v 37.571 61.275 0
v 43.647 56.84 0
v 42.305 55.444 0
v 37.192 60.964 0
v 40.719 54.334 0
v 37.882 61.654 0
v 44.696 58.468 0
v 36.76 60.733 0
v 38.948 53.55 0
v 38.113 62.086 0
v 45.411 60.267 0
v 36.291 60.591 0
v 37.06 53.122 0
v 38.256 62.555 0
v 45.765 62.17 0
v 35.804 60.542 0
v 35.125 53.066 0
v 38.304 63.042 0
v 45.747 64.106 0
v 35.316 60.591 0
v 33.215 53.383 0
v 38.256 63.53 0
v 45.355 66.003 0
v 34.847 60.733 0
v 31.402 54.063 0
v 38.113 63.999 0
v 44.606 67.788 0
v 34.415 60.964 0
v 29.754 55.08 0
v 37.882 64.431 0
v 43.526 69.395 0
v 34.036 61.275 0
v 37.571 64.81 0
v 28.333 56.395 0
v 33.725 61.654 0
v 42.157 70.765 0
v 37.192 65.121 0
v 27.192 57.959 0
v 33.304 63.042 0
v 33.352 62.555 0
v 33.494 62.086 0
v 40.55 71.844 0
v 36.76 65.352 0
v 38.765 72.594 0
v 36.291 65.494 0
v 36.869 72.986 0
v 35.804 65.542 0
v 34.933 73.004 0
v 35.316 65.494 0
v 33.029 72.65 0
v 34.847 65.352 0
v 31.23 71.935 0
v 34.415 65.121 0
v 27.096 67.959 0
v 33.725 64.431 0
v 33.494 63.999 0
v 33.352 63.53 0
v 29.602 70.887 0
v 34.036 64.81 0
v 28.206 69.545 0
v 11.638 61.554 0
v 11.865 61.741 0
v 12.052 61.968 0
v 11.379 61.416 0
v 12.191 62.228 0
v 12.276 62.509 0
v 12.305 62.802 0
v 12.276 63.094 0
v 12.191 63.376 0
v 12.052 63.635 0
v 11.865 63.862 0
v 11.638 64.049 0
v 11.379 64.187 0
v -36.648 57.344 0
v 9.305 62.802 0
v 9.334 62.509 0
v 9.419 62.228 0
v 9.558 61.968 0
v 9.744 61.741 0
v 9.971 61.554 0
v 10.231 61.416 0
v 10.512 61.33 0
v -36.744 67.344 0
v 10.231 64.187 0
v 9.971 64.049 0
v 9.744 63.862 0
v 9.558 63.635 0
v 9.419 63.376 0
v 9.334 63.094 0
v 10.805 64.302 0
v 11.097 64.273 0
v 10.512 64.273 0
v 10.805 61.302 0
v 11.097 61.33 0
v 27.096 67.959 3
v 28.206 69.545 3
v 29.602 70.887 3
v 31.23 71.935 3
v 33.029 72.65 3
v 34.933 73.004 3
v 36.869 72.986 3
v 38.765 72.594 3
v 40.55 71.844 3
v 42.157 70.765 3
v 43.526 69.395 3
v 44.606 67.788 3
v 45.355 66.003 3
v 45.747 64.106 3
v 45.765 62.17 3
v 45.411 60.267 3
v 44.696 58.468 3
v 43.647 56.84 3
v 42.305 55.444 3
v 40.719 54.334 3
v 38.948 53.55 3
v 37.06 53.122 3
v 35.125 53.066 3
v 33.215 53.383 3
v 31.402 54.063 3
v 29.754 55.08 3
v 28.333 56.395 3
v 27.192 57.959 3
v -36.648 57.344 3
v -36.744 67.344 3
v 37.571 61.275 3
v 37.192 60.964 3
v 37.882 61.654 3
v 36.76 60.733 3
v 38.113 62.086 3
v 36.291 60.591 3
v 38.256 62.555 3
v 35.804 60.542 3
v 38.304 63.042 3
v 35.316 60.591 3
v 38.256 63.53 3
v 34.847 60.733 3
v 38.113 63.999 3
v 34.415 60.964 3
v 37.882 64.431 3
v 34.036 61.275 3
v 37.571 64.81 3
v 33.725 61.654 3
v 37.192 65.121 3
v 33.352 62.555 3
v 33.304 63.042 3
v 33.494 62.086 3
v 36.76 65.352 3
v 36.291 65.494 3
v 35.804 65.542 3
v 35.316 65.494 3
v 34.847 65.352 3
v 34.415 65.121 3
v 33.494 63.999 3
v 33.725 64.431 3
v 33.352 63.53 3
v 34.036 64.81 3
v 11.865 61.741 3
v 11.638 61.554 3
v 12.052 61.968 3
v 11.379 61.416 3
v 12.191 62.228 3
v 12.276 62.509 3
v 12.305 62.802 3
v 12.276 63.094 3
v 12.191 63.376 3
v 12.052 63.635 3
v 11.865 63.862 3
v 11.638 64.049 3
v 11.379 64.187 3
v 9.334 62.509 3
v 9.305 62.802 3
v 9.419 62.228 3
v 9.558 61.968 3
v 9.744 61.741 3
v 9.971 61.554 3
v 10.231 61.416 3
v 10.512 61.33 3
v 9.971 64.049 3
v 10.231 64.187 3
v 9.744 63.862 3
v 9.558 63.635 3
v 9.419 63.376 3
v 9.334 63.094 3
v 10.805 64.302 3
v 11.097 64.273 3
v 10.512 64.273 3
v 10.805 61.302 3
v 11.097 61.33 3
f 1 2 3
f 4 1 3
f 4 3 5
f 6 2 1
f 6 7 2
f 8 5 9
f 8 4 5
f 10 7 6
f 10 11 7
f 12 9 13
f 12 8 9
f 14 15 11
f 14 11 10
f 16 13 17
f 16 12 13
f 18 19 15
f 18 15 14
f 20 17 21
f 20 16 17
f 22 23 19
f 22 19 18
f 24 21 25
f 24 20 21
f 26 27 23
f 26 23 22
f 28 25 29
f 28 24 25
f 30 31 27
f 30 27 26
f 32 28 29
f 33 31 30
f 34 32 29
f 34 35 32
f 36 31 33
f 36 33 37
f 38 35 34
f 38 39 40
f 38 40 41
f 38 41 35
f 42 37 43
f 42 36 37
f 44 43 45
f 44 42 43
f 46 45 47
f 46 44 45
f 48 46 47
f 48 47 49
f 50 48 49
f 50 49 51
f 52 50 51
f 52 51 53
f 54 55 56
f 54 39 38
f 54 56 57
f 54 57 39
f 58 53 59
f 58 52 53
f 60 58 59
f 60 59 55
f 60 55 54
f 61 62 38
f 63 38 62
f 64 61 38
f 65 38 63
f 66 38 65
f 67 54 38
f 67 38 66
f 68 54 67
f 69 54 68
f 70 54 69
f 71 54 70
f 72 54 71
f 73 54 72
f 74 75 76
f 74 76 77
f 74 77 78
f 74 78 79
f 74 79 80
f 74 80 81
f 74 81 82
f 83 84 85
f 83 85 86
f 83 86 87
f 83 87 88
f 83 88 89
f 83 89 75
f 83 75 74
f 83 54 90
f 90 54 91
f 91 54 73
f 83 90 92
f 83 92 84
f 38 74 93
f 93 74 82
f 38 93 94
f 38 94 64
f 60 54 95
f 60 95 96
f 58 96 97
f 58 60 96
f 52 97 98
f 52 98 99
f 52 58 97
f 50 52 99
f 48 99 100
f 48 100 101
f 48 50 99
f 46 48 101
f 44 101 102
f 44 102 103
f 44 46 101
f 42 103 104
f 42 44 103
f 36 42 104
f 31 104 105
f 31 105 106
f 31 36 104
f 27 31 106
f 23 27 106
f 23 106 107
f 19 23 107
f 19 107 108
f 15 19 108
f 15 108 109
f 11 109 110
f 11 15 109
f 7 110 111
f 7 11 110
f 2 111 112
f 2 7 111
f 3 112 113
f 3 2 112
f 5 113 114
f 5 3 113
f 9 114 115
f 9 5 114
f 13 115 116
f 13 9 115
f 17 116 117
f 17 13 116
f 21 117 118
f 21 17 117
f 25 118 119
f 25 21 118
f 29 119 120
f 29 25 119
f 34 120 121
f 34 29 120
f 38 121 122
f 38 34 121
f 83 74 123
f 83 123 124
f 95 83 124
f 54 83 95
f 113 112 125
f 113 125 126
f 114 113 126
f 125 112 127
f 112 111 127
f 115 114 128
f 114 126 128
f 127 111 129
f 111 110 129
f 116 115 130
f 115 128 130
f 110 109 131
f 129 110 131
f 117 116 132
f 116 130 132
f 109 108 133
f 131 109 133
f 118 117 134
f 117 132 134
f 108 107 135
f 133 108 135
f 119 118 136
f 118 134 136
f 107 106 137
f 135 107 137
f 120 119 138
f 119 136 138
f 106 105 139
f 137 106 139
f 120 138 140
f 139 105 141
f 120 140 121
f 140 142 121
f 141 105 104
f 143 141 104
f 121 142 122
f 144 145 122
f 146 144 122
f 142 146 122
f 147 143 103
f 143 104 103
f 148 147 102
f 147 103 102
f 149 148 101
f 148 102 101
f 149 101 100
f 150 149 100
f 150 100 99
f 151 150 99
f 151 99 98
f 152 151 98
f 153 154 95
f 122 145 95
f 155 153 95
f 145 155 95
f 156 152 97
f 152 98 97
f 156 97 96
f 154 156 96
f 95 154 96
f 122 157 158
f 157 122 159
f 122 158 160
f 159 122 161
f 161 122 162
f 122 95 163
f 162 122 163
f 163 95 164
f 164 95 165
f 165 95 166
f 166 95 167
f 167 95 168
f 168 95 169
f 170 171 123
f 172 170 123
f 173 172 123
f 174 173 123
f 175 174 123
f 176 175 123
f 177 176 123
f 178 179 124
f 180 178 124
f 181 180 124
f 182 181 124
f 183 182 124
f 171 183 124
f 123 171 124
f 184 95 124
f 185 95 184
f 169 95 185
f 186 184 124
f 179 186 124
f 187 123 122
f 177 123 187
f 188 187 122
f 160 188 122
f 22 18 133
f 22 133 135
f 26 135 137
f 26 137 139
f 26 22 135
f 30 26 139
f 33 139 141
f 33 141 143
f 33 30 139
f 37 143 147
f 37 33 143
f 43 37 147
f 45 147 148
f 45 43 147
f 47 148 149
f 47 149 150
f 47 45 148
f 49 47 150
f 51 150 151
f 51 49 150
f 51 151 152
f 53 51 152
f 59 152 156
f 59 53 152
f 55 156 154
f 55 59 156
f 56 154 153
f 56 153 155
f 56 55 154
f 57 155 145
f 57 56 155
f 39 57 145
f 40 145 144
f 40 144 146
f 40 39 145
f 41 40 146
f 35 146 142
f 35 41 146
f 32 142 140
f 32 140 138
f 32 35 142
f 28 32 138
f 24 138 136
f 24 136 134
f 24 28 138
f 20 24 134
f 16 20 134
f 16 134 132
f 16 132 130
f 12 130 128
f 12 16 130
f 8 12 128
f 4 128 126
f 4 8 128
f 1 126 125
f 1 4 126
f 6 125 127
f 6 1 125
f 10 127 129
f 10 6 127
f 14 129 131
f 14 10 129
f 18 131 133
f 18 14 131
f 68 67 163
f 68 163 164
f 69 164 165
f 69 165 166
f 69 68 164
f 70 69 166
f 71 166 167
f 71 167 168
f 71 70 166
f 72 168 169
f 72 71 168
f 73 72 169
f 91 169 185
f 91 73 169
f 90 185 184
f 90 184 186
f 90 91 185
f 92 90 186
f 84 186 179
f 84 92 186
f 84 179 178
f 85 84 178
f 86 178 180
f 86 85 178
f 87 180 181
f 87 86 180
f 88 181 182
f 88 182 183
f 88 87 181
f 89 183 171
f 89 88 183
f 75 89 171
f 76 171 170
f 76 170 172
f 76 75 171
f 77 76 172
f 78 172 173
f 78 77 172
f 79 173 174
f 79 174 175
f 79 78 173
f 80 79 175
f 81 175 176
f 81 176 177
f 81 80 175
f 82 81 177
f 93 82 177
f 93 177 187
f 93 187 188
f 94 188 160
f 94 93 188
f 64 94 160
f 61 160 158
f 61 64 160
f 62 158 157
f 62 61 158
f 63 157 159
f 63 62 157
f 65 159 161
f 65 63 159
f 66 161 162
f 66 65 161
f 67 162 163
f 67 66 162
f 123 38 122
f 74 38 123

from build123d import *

# Parameters (mm, degrees)
SKETCH1_R           = 2.5
SKETCH1_R_2         = 1.500000002
BOSS_EXTRUDE1_DEPTH = 3


with BuildPart() as part:
    # Sketch1 → Boss-Extrude1 (new body)
    with BuildSketch(Plane.XY):
        with BuildLine():
            Line((-36.744474703, 67.343539136), (27.095525297, 67.958794059))
            ThreePointArc((27.095525297, 67.958794059), (45.803097829, 63.138855192), (27.191895339, 57.959258429))
            Line((27.191895339, 57.959258429), (-36.648104661, 57.344003506))
            Line((-36.648104661, 57.344003506), (-36.744474703, 67.343539136))
        make_face()
        with Locations((35.803562199, 63.04248515)):
            Circle(SKETCH1_R, mode=Mode.SUBTRACT)
        with Locations((10.804723125, 62.801560043)):
            Circle(SKETCH1_R_2, mode=Mode.SUBTRACT)
    extrude(amount=BOSS_EXTRUDE1_DEPTH)


solid = part.part
